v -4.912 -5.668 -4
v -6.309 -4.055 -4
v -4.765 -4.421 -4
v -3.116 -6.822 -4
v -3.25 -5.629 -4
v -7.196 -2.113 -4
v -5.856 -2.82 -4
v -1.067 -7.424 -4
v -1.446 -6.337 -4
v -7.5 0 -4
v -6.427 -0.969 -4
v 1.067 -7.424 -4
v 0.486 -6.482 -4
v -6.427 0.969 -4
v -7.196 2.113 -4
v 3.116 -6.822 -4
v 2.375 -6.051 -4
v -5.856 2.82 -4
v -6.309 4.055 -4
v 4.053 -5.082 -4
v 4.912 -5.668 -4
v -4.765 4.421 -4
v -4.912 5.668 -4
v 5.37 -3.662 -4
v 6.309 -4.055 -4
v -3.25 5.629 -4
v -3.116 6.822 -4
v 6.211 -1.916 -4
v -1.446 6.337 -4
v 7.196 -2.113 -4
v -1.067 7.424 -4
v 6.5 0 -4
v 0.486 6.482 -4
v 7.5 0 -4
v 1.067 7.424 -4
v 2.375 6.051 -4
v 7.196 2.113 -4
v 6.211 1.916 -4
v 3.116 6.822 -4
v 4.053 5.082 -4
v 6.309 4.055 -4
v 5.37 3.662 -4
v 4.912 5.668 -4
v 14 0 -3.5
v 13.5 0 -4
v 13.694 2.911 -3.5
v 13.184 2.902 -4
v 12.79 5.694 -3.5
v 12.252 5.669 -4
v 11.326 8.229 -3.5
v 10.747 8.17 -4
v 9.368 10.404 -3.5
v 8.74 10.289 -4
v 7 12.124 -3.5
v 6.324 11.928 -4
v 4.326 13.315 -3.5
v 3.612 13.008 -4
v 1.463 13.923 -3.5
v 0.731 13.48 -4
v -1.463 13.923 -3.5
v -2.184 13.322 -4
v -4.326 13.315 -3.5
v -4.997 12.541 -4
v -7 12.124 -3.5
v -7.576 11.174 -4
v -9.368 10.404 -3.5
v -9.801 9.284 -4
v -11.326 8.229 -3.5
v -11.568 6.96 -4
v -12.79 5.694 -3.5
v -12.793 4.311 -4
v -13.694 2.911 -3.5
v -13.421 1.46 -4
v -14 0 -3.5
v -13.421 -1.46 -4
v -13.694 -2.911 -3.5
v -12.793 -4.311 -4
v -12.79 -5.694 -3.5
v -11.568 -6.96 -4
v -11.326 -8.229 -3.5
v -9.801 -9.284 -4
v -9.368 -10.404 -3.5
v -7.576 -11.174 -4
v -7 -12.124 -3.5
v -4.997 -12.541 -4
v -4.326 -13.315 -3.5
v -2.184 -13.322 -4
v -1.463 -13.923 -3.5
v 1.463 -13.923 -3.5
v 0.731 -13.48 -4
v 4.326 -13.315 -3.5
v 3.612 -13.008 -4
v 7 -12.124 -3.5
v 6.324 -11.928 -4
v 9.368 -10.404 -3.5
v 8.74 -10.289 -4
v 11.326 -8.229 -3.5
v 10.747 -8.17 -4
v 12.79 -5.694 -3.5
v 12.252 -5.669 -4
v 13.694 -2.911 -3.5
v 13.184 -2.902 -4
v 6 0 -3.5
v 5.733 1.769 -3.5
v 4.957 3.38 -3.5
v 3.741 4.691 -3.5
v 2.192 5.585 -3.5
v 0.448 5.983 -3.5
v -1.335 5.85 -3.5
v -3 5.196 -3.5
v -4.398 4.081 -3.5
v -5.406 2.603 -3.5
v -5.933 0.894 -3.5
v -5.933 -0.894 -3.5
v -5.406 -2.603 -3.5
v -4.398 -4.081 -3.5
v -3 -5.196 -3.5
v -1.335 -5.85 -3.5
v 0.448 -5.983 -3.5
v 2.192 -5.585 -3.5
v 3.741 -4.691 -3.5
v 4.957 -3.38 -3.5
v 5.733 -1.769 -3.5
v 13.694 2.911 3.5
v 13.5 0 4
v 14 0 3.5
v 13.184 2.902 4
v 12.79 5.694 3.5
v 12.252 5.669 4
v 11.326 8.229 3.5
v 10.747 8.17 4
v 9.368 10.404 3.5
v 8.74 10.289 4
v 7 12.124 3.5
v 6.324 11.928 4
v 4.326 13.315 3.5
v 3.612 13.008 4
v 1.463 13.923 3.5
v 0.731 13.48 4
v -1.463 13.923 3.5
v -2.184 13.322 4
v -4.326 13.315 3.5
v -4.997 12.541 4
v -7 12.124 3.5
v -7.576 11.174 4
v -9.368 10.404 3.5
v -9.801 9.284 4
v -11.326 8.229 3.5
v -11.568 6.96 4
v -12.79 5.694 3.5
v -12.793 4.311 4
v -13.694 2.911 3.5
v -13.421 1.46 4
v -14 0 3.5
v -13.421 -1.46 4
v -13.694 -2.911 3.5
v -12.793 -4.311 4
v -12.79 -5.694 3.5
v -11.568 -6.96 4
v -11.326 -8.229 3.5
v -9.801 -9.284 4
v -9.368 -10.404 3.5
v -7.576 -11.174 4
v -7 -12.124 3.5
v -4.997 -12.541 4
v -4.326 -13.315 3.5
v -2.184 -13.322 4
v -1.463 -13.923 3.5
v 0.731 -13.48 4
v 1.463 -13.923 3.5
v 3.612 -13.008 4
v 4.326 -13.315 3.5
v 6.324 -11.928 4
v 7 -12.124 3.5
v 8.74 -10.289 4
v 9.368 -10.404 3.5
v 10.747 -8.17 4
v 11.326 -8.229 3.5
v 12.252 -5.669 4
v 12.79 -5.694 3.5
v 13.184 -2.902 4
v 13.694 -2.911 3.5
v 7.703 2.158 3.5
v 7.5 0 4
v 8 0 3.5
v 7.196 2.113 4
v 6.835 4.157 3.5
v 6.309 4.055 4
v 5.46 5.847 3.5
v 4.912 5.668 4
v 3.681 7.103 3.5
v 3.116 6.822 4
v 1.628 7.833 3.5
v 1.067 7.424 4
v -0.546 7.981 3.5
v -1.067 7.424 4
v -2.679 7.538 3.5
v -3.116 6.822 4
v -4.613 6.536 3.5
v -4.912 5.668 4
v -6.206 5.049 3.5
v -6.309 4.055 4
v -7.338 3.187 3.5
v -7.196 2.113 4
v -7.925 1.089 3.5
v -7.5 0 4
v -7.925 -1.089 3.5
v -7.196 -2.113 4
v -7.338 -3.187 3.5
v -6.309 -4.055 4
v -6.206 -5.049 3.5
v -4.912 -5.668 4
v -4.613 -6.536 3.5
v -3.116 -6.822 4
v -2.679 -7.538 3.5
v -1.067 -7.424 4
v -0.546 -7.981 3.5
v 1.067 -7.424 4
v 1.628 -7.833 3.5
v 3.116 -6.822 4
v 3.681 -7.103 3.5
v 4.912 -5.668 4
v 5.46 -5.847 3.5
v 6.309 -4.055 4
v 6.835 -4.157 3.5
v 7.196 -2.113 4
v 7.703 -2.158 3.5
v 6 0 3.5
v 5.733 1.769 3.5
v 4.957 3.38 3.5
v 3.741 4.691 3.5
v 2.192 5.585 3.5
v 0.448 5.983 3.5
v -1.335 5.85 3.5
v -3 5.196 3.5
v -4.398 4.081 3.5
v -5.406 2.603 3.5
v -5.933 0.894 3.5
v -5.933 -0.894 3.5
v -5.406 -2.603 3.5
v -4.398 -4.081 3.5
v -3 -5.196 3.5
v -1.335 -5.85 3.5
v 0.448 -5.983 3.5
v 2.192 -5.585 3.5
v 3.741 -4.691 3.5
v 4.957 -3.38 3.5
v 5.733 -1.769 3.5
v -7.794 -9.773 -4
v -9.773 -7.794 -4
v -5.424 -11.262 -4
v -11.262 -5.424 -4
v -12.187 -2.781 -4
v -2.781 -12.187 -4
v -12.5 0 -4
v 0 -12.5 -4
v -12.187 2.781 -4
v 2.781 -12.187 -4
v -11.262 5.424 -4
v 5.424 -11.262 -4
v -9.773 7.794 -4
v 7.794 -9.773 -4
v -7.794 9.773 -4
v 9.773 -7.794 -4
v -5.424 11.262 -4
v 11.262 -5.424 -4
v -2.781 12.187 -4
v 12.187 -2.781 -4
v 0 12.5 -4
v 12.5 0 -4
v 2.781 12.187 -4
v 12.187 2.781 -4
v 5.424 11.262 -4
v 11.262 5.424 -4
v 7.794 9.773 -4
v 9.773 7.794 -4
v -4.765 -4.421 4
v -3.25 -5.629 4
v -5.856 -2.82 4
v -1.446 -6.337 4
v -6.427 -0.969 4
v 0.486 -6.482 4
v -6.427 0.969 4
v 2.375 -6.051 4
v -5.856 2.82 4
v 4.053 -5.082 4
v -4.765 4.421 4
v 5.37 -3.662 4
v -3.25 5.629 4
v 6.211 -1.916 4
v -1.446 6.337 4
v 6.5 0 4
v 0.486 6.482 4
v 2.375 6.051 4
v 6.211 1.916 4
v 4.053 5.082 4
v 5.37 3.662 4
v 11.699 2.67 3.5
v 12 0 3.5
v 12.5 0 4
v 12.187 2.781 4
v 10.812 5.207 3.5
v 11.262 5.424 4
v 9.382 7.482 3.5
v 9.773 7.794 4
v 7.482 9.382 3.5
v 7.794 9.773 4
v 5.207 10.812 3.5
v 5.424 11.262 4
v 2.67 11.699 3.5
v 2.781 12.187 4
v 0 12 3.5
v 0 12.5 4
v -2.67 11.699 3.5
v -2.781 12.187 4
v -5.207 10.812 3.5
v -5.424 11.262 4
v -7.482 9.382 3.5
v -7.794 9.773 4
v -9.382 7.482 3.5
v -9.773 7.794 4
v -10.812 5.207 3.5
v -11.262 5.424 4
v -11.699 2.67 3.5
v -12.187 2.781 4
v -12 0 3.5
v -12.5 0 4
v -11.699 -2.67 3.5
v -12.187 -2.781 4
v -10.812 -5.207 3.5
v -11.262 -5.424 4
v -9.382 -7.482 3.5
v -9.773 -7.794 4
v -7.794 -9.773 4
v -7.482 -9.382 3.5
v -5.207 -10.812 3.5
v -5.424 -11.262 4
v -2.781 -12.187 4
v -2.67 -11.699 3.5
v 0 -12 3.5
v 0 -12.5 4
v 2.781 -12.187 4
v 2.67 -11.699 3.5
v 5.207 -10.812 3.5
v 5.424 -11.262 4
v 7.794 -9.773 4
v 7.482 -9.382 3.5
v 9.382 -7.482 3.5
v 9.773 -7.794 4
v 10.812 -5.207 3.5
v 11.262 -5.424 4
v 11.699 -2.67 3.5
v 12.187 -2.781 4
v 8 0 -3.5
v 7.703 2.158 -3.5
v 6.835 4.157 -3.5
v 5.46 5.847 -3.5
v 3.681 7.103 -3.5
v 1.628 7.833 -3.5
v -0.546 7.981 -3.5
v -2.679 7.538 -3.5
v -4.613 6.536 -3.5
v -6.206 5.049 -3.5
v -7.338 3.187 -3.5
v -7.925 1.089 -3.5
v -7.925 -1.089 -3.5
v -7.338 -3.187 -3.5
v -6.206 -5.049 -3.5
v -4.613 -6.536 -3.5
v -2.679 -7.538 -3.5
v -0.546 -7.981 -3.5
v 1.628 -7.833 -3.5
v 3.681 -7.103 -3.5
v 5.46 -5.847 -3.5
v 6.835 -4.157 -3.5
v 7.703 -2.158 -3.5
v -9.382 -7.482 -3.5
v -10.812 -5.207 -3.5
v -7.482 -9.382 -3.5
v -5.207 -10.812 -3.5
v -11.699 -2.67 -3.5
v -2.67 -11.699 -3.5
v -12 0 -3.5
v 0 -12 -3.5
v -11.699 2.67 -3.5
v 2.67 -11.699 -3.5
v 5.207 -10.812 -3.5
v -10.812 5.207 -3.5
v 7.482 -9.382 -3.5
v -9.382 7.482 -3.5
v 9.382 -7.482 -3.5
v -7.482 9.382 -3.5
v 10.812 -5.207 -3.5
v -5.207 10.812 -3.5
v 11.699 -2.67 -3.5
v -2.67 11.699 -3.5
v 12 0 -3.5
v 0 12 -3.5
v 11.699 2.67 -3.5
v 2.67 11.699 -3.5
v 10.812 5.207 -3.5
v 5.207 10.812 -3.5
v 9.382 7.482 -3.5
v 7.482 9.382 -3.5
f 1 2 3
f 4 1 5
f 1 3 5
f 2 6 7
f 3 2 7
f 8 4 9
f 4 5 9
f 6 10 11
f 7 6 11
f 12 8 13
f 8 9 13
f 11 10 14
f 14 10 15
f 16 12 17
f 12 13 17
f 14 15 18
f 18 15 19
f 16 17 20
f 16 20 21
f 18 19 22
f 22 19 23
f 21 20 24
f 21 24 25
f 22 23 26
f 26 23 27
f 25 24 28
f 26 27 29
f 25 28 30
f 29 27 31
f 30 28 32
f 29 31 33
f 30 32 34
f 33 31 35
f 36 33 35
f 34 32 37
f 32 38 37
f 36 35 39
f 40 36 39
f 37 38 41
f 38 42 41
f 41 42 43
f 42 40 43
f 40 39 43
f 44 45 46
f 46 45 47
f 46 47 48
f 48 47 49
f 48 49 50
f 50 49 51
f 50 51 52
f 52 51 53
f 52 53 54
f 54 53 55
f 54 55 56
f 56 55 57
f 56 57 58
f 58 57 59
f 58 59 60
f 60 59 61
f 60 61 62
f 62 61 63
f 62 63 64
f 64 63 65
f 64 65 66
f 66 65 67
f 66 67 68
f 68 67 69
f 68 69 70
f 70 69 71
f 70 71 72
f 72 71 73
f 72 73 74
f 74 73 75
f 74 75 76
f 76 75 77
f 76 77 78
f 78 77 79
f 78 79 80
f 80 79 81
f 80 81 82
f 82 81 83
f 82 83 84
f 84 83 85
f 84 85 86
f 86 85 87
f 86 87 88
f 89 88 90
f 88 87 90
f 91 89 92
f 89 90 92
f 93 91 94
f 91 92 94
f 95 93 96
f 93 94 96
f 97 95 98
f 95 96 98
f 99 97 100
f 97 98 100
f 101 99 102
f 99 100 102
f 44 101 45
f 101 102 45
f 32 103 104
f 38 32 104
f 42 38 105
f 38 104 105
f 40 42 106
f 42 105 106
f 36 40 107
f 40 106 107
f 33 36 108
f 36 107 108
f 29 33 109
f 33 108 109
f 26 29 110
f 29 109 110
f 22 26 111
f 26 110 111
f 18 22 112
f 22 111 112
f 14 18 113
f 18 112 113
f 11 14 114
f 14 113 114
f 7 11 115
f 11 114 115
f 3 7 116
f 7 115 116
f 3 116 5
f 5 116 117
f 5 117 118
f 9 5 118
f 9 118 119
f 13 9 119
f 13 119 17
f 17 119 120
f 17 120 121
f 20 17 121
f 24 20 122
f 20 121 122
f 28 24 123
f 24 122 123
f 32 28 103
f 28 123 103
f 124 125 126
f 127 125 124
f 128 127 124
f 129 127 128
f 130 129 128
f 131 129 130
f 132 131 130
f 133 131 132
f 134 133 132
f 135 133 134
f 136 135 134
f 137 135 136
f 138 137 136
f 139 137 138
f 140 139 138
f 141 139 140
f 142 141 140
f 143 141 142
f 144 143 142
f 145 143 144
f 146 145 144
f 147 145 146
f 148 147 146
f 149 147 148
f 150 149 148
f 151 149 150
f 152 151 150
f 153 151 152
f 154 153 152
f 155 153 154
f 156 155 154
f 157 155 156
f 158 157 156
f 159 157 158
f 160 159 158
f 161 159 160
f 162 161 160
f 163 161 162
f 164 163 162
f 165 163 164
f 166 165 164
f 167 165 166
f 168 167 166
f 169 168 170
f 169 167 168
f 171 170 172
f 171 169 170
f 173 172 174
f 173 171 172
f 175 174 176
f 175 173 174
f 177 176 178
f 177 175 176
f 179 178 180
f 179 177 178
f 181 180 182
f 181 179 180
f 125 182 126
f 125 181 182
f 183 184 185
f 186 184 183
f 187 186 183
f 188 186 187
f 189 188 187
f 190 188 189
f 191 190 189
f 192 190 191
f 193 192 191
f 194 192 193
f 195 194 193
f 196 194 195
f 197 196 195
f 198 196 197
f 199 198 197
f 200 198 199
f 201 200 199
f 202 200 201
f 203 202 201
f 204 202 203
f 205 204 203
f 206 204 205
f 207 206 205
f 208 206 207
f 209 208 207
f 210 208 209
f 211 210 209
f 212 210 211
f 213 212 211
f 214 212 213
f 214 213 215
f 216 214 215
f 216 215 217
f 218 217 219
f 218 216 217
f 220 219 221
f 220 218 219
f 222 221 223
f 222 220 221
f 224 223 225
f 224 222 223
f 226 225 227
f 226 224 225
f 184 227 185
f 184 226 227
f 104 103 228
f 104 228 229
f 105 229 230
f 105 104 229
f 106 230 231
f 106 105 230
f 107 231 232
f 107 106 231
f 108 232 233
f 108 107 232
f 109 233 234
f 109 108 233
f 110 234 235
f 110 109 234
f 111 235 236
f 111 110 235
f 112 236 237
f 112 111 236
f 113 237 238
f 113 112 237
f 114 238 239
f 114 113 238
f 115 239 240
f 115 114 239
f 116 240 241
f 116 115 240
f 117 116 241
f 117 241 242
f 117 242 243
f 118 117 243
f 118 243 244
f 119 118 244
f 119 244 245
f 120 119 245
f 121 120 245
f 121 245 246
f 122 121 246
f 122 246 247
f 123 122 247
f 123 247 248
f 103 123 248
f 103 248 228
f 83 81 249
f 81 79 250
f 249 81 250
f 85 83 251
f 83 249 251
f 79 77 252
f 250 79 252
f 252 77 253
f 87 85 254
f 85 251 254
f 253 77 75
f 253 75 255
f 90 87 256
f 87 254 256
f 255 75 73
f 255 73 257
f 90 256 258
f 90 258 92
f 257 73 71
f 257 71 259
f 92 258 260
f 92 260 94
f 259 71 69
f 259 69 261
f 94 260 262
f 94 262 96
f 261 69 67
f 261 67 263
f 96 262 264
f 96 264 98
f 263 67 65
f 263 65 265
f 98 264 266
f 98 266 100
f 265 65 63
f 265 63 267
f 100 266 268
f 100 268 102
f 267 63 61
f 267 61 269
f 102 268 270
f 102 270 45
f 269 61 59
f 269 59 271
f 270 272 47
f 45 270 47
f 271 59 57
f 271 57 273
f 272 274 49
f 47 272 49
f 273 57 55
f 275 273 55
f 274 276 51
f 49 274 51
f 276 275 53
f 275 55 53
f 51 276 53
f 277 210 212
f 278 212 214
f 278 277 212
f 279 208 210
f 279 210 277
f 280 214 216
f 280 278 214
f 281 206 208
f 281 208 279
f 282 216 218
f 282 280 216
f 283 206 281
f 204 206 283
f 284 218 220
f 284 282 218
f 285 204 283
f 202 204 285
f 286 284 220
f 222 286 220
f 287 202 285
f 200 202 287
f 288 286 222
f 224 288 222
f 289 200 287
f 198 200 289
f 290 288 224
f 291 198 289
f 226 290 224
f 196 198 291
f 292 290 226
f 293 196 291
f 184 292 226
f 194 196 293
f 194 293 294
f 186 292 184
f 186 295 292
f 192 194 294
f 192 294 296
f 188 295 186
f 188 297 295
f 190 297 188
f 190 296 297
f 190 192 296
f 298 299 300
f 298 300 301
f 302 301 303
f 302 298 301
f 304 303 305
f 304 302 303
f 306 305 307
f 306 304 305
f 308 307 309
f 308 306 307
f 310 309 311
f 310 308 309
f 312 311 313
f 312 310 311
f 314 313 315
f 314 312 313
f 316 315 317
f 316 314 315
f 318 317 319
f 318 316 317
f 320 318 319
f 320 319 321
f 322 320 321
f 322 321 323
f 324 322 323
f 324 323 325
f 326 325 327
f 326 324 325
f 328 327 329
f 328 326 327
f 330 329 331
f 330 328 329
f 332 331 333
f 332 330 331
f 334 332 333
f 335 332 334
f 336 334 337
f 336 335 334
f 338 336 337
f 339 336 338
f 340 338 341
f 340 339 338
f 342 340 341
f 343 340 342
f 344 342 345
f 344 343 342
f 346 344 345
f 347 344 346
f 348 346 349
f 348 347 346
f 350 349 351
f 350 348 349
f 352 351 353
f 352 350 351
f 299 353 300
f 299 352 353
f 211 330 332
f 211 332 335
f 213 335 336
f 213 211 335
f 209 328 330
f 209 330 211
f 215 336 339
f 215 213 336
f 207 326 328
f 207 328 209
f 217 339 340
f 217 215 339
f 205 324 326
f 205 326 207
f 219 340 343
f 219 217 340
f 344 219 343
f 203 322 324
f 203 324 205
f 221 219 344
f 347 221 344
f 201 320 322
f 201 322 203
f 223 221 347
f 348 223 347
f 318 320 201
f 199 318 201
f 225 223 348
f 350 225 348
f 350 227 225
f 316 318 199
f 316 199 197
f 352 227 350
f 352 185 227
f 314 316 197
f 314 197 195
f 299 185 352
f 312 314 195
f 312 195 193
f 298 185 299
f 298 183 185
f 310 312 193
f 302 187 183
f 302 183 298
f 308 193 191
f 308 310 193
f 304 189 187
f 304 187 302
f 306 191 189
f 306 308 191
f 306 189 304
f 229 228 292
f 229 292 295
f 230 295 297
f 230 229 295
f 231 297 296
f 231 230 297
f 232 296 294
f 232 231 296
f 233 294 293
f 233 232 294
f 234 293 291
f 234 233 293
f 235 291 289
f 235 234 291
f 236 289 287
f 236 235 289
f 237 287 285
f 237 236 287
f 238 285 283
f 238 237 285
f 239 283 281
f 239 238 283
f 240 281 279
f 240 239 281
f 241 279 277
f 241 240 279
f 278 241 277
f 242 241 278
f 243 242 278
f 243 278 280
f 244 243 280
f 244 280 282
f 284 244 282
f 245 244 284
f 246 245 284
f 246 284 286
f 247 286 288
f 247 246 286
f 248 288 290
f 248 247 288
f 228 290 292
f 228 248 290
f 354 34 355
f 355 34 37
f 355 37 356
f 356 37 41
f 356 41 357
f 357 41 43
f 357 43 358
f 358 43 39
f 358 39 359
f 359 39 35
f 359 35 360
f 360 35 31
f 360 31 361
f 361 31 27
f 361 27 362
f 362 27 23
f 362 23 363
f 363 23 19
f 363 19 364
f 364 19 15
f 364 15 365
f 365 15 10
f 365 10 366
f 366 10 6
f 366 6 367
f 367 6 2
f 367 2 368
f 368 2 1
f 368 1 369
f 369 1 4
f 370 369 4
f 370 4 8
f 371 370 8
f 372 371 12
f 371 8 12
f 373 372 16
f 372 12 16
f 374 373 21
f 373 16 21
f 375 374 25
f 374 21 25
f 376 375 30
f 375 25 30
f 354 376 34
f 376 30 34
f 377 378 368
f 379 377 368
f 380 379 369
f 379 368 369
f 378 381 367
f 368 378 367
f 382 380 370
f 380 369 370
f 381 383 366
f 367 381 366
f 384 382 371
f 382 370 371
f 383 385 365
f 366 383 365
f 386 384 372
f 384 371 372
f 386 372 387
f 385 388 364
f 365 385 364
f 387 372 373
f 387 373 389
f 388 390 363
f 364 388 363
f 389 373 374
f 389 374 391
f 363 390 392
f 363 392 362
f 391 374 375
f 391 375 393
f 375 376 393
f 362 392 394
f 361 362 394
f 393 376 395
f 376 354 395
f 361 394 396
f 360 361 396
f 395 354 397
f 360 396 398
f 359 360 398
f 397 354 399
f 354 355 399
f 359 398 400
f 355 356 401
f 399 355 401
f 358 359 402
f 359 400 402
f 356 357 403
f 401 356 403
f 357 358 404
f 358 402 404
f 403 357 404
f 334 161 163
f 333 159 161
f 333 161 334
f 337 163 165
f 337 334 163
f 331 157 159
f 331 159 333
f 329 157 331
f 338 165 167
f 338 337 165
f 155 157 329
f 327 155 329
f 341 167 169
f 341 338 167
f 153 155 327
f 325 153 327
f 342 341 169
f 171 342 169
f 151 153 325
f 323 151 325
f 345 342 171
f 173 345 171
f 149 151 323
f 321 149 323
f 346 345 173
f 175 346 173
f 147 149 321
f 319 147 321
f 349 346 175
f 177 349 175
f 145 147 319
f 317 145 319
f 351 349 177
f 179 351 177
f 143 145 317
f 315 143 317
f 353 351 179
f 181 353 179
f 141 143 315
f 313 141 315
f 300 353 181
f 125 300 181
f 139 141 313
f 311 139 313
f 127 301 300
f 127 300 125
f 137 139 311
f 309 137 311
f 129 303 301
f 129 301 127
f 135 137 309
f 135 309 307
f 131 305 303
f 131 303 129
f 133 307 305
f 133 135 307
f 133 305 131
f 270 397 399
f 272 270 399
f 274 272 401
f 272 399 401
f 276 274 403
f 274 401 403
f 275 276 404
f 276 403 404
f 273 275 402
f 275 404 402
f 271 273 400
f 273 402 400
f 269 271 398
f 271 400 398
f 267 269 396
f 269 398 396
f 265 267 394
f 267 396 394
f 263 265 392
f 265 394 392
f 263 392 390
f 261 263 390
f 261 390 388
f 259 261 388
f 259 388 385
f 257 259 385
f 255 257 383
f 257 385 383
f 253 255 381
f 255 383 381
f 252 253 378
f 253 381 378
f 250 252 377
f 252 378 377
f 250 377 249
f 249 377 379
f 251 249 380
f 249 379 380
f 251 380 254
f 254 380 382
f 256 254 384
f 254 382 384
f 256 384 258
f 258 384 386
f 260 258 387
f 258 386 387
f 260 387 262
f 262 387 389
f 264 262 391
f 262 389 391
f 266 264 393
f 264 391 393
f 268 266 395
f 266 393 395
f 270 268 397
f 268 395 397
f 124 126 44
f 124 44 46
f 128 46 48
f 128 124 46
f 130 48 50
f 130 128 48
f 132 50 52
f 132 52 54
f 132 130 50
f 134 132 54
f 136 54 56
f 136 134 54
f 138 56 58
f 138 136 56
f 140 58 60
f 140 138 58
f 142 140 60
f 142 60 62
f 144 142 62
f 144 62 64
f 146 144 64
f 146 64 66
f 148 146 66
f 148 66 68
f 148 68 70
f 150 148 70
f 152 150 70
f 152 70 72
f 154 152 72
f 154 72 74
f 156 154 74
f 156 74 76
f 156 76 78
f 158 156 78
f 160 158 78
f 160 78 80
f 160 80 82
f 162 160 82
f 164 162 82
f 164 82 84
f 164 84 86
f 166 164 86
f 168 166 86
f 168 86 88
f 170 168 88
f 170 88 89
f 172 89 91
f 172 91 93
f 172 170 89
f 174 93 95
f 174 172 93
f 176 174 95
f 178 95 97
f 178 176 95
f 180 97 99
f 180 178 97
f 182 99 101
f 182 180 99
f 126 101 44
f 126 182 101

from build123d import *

# Parameters (mm, degrees)
SKETCH1_R           = 14
SKETCH1_R_2         = 6
BOSS_EXTRUDE1_DEPTH = 4
CUT_EXTRUDE1_START  = -4
SKETCH1_3_R         = 12
SKETCH1_3_R_2       = 8
CUT_EXTRUDE1_DEPTH  = 0.5
CUT_EXTRUDE2_START  = 3.5
SKETCH1_4_R         = 12
SKETCH1_4_R_2       = 8
CUT_EXTRUDE2_DEPTH  = 0.5
CHAMFER1_SIZE       = 0.5


with BuildPart() as part:
    # Sketch1 → Boss-Extrude1 (new, symmetric)
    with BuildSketch(Plane.XY):
        Circle(SKETCH1_R)
        Circle(SKETCH1_R_2, mode=Mode.SUBTRACT)
    extrude(amount=BOSS_EXTRUDE1_DEPTH, both=True)

    # Sketch1<3> → Cut-Extrude1 (cut)
    with BuildSketch(Plane.XY.offset(CUT_EXTRUDE1_START)):
        Circle(SKETCH1_3_R)
        Circle(SKETCH1_3_R_2, mode=Mode.SUBTRACT)
    extrude(amount=CUT_EXTRUDE1_DEPTH, mode=Mode.SUBTRACT)

    # Sketch1<4> → Cut-Extrude2 (cut)
    with BuildSketch(Plane.XY.offset(CUT_EXTRUDE2_START)):
        Circle(SKETCH1_4_R)
        Circle(SKETCH1_4_R_2, mode=Mode.SUBTRACT)
    extrude(amount=CUT_EXTRUDE2_DEPTH, mode=Mode.SUBTRACT)

    # Chamfer1
    chamfer1_edges = [part.edges().sort_by_distance(p)[0] for p in [
        (-8, 0, -4),
        (-12, 0, -4),
        (-14, 0, -4),
        (-12, 0, 4),
        (-8, 0, 4),
        (-14, 0, 4),
        (-6, 0, -4),
        (-6, 0, 4),
    ]]
    chamfer(chamfer1_edges, length=CHAMFER1_SIZE - 0.0001)  # a hair under: the kernel refuses the full size


solid = part.part
